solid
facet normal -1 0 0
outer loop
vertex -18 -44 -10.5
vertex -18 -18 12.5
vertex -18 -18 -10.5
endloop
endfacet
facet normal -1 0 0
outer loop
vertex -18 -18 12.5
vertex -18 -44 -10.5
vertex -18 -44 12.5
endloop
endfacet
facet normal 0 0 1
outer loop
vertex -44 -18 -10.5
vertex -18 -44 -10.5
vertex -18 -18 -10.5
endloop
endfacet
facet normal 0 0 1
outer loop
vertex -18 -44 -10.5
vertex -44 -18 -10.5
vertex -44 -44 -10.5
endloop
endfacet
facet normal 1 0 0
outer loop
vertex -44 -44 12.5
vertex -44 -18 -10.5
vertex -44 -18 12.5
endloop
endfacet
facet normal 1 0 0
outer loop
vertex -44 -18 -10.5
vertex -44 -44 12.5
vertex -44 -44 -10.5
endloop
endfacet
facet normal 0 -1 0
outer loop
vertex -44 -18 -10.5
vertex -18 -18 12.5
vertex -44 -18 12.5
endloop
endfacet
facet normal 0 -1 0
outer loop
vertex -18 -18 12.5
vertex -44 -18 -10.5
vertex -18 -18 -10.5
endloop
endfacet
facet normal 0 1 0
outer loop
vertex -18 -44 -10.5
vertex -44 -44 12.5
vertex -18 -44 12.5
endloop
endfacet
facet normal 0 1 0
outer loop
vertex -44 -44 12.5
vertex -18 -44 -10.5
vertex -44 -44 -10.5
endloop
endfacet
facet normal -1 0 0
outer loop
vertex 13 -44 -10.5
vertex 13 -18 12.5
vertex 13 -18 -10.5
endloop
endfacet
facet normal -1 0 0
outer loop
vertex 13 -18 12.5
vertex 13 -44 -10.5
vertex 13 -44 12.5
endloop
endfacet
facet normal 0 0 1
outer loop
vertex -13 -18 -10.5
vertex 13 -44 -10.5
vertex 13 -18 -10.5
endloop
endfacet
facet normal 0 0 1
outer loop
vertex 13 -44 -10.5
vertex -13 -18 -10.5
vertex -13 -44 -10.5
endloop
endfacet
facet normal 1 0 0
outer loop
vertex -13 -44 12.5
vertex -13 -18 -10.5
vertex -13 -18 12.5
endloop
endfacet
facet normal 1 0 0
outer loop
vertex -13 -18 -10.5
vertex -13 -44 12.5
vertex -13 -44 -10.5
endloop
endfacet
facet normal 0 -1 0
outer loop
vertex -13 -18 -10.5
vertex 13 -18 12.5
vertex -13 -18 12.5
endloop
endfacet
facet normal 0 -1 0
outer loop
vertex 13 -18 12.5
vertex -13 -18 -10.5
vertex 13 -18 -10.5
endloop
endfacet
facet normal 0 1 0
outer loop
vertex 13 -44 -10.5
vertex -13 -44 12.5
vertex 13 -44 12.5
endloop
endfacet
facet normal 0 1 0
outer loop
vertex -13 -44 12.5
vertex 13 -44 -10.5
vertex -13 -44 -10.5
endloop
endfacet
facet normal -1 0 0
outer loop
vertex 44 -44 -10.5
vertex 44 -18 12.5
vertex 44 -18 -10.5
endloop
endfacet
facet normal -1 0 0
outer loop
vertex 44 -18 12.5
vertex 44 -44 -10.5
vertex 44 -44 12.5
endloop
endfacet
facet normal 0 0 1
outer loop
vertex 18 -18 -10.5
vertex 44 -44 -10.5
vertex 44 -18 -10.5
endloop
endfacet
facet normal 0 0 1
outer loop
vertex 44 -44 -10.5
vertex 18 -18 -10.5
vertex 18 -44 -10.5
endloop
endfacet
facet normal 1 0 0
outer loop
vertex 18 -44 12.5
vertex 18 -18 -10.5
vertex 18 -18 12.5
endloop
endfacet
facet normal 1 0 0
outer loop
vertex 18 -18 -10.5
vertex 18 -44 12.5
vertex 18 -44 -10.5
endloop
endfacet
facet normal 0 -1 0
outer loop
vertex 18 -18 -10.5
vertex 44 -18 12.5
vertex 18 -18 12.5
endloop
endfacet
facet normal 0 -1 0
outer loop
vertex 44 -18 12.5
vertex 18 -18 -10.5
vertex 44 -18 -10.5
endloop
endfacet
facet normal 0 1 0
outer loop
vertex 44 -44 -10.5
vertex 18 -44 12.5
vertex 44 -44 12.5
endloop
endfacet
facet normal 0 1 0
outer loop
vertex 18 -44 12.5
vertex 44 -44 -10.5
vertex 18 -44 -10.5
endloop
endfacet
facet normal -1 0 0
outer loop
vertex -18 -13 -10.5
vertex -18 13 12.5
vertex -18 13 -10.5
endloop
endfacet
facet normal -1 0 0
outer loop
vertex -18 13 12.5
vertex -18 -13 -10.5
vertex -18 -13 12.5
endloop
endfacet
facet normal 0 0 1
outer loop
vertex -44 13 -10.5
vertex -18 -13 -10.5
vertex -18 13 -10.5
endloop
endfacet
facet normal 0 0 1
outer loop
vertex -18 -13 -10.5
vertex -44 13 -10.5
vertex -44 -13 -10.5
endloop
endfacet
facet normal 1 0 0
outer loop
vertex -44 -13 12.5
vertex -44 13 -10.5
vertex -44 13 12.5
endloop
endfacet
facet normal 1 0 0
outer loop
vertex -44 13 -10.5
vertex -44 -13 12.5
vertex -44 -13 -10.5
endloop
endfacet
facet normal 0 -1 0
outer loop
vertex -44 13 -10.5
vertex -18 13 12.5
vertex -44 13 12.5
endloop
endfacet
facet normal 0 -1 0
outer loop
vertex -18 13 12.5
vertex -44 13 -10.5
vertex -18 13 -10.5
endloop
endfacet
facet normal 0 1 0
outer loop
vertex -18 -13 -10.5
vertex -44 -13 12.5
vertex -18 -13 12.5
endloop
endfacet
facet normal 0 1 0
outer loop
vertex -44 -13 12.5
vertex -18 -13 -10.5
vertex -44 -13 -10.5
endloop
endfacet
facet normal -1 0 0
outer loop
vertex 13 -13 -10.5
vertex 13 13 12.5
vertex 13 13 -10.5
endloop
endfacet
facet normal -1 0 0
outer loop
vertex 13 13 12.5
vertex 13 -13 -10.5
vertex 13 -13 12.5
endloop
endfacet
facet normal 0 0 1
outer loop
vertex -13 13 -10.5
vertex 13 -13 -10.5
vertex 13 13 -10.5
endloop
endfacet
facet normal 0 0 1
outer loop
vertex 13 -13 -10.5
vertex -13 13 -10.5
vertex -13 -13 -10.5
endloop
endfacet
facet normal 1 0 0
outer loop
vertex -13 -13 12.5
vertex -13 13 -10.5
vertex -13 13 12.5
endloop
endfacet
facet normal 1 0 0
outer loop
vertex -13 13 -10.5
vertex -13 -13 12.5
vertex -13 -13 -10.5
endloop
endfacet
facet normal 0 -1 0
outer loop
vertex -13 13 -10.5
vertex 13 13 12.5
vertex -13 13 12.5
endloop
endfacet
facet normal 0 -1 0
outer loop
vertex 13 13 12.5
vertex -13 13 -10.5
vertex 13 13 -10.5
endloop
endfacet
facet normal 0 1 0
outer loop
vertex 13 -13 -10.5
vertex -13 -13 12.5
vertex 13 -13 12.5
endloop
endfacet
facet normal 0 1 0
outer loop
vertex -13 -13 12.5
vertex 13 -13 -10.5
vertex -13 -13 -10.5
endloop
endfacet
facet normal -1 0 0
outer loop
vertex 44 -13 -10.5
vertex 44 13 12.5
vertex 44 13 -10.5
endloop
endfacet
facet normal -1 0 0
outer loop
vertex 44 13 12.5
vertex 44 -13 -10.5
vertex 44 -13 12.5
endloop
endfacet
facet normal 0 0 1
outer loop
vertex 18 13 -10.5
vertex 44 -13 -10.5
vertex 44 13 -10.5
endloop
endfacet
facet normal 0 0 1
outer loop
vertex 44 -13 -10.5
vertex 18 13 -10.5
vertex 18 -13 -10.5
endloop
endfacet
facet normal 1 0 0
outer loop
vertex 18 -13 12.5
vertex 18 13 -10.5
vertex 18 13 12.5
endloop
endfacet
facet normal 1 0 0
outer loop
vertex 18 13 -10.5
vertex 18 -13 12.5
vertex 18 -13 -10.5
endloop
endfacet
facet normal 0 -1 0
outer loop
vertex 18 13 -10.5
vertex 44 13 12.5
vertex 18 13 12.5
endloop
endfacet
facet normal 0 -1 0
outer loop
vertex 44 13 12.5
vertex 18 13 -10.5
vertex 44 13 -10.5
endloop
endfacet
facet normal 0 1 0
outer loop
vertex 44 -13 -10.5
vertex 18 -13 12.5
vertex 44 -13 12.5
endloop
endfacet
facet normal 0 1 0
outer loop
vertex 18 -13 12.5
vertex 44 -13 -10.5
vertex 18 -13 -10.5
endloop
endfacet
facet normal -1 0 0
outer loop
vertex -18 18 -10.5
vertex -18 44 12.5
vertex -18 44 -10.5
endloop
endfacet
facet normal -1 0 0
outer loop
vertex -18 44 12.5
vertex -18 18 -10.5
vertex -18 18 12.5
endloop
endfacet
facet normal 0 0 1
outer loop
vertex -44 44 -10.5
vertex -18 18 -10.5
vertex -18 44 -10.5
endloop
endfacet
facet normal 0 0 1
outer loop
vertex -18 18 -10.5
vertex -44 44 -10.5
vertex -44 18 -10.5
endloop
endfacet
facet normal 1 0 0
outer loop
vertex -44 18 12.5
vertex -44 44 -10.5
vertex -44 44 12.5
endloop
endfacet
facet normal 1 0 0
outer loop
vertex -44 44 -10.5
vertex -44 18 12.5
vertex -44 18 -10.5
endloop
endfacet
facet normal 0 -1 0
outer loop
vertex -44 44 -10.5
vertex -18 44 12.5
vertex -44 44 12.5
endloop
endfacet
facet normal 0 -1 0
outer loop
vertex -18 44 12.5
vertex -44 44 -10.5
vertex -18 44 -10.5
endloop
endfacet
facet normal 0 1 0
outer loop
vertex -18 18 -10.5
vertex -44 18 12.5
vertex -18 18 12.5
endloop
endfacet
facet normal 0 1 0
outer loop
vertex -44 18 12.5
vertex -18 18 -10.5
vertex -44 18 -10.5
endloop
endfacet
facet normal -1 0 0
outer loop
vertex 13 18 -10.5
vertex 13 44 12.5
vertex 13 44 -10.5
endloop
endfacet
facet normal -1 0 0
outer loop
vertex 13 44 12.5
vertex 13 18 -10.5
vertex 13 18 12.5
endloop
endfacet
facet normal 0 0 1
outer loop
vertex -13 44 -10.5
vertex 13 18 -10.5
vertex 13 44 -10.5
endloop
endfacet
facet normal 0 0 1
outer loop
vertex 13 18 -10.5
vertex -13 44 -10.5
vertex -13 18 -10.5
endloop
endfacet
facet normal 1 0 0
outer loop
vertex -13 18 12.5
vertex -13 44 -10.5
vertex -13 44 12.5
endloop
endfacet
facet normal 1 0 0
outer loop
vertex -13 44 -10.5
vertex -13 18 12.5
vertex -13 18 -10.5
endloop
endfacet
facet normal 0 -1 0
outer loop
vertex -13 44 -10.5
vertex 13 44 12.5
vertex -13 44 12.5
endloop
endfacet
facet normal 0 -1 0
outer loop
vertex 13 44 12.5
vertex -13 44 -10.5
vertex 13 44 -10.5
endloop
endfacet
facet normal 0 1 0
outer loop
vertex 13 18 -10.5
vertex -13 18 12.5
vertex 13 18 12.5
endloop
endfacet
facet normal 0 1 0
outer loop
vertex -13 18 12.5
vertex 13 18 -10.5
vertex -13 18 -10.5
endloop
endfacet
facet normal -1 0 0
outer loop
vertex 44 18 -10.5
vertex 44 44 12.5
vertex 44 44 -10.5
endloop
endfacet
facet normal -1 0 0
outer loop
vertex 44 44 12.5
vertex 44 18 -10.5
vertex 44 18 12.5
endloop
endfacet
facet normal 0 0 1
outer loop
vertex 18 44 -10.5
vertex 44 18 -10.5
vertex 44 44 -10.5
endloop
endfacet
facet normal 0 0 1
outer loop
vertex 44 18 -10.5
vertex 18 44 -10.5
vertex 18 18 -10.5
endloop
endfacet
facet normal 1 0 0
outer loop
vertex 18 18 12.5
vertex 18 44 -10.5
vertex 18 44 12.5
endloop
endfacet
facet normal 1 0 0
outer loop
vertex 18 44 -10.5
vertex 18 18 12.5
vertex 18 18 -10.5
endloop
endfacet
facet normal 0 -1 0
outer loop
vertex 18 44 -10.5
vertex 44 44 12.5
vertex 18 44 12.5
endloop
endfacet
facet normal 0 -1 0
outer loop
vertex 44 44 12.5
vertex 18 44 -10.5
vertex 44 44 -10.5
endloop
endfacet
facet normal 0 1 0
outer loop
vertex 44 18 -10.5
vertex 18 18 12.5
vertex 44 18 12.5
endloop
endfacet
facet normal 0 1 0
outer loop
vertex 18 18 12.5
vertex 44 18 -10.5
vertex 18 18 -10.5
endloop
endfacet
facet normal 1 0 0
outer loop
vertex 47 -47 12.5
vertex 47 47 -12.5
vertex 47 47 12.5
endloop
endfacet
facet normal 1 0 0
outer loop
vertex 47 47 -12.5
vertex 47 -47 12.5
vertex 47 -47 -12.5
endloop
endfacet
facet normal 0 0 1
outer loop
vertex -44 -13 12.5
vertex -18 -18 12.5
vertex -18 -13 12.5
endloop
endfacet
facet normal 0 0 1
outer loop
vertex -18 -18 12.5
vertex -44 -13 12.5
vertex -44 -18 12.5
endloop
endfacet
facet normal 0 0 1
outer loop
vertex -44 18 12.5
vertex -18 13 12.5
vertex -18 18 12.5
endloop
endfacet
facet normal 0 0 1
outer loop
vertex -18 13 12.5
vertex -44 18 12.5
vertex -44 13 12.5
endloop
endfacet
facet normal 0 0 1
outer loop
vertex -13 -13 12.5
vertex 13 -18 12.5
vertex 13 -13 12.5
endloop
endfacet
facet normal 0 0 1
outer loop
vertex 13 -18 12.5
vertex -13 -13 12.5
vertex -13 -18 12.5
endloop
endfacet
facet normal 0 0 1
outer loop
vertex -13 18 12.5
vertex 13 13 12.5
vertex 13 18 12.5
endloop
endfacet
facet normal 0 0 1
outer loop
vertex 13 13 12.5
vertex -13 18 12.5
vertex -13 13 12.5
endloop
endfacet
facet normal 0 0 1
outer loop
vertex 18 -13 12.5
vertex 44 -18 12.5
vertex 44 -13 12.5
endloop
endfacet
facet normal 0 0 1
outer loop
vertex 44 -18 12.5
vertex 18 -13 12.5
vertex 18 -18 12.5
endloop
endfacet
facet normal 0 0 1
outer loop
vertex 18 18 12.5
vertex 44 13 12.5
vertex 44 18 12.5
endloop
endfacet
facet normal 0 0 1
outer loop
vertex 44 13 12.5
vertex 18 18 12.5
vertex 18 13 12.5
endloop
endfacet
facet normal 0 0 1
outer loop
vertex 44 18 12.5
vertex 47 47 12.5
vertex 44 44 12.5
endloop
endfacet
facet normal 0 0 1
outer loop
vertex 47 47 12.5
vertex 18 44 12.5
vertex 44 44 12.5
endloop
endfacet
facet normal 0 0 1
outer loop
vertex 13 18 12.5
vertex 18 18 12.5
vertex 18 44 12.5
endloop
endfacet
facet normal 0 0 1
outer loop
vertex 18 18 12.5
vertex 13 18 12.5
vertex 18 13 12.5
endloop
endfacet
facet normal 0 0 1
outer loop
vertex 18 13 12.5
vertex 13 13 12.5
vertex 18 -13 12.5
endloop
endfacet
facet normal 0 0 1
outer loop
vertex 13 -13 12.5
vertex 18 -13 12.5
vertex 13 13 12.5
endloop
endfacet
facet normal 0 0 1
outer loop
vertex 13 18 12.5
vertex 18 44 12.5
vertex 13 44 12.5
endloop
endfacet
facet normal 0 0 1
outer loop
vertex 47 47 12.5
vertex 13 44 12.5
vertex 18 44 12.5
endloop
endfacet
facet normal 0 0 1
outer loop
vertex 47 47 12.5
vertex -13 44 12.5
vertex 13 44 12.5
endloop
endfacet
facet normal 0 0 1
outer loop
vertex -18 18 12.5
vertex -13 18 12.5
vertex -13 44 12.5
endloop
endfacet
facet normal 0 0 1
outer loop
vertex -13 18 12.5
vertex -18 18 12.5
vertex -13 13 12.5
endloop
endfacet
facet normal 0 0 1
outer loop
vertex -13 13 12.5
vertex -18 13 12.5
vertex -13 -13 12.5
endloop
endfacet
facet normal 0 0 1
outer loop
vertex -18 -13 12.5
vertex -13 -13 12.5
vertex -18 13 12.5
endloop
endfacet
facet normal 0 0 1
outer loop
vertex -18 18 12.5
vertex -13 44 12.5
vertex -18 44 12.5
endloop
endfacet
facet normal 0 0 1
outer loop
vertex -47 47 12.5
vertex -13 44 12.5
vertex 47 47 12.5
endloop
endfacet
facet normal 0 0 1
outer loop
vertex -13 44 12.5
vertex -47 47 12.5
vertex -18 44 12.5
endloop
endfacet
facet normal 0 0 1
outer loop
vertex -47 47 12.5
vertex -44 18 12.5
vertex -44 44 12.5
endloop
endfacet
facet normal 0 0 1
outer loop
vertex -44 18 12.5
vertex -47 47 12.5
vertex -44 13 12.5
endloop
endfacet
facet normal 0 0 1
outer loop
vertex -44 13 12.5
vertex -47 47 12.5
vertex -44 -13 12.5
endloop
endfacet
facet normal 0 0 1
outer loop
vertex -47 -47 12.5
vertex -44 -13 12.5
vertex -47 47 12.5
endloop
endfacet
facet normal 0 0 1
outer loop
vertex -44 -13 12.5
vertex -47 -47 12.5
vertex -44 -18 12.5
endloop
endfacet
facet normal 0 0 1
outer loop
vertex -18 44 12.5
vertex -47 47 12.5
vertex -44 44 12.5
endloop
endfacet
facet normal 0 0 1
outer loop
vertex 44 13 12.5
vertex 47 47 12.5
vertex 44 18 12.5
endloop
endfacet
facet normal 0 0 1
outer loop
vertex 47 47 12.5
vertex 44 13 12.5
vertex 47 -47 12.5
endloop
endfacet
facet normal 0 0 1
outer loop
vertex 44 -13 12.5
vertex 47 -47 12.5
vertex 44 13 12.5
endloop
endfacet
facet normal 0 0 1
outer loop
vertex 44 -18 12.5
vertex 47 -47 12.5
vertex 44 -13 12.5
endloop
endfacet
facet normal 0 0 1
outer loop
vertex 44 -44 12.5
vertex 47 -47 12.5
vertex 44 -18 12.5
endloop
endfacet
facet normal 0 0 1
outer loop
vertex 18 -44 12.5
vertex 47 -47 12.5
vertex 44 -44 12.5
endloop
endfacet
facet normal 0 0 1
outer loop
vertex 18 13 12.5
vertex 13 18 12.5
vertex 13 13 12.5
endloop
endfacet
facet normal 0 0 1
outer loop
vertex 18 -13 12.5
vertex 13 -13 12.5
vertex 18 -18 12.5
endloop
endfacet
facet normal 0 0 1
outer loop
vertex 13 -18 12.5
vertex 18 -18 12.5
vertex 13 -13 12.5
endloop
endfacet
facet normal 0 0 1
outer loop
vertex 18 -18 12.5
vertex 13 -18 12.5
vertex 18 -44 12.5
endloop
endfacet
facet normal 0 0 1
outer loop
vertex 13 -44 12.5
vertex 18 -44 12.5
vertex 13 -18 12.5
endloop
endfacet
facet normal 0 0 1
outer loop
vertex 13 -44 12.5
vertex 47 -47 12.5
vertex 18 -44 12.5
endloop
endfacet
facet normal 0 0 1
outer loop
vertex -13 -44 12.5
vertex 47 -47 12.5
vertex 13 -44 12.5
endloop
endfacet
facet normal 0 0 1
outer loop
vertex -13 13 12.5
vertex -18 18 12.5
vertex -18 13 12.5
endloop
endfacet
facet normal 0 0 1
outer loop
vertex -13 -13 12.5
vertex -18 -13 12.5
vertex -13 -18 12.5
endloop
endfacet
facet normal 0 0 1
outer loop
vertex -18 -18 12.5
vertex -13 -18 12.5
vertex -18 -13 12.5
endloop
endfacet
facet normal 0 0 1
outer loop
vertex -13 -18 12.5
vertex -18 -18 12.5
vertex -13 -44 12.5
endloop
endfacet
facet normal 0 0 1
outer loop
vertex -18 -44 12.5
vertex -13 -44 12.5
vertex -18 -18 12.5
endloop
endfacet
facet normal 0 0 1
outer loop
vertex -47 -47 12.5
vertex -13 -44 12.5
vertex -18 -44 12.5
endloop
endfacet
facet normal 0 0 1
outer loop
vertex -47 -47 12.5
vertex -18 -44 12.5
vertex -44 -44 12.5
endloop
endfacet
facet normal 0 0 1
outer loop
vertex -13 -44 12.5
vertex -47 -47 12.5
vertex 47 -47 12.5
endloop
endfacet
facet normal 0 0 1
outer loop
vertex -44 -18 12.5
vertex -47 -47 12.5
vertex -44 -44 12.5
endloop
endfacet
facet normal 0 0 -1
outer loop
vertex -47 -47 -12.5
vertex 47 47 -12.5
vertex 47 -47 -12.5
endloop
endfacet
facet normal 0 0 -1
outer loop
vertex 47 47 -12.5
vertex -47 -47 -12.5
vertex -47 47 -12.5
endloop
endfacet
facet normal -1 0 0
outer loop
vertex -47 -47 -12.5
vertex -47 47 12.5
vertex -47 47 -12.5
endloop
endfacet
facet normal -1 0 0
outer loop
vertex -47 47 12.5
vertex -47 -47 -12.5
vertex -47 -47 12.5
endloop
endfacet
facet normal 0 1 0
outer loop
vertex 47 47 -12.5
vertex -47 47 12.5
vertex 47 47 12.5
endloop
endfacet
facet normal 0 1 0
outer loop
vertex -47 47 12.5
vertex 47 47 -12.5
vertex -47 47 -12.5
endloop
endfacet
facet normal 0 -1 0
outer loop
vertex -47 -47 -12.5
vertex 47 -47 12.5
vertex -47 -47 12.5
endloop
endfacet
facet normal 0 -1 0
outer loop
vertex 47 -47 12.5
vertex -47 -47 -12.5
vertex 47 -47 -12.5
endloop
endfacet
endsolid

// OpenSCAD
$fn = 32;

// ----------------------------------------------------------------------
// Pocket plate 94 x 94 x 25
// 3 x 3 pockets 26 mm square, 23 mm deep
// ----------------------------------------------------------------------

// --- parameters (mm) ---
thickness = 25;  // plate thickness
floor_t = 2;     // material left under each pocket
pocket = 26;     // pocket side length
pitch_x = 31;    // pocket pitch along X
pitch_y = 31;    // pocket pitch along Y
cols = 3;        // pockets per row
rows = 3;        // rows of pockets

// --- derived feature positions (mm) ---
depth = thickness - floor_t;        // = 23   pocket depth, down to the floor
span_x = (cols - 1) * pitch_x;      // = 62   distance between outer pockets
span_y = (rows - 1) * pitch_y;      // = 62   distance between outer pocket rows
origin_x = -span_x / 2;             // = -31   X of the first pocket
origin_y = -span_y / 2;             // = -31   Y of the first pocket
plate = [span_x + pocket + 6, span_y + pocket + 6, thickness];  // = [94, 94, 25]   overall size: pockets plus 3 mm of wall on each side
feature_centers = [
  [origin_x + 0 * pitch_x, origin_y + 0 * pitch_y],
  [origin_x + 1 * pitch_x, origin_y + 0 * pitch_y],
  [origin_x + 2 * pitch_x, origin_y + 0 * pitch_y],
  [origin_x + 0 * pitch_x, origin_y + 1 * pitch_y],
  [origin_x + 1 * pitch_x, origin_y + 1 * pitch_y],
  [origin_x + 2 * pitch_x, origin_y + 1 * pitch_y],
  [origin_x + 0 * pitch_x, origin_y + 2 * pitch_y],
  [origin_x + 1 * pitch_x, origin_y + 2 * pitch_y],
  [origin_x + 2 * pitch_x, origin_y + 2 * pitch_y]
];   // pocket centres, used verbatim by the cutter loop

// plate outline, then one pocket per centre in feature_centers
difference() {
  cube(plate, center = true);
  for (centre = feature_centers)
    translate([centre[0] - pocket / 2, centre[1] - pocket / 2, plate[2] / 2 - depth])
      cube([pocket, pocket, depth + 1]);  // centred on the declared pocket centre
}
